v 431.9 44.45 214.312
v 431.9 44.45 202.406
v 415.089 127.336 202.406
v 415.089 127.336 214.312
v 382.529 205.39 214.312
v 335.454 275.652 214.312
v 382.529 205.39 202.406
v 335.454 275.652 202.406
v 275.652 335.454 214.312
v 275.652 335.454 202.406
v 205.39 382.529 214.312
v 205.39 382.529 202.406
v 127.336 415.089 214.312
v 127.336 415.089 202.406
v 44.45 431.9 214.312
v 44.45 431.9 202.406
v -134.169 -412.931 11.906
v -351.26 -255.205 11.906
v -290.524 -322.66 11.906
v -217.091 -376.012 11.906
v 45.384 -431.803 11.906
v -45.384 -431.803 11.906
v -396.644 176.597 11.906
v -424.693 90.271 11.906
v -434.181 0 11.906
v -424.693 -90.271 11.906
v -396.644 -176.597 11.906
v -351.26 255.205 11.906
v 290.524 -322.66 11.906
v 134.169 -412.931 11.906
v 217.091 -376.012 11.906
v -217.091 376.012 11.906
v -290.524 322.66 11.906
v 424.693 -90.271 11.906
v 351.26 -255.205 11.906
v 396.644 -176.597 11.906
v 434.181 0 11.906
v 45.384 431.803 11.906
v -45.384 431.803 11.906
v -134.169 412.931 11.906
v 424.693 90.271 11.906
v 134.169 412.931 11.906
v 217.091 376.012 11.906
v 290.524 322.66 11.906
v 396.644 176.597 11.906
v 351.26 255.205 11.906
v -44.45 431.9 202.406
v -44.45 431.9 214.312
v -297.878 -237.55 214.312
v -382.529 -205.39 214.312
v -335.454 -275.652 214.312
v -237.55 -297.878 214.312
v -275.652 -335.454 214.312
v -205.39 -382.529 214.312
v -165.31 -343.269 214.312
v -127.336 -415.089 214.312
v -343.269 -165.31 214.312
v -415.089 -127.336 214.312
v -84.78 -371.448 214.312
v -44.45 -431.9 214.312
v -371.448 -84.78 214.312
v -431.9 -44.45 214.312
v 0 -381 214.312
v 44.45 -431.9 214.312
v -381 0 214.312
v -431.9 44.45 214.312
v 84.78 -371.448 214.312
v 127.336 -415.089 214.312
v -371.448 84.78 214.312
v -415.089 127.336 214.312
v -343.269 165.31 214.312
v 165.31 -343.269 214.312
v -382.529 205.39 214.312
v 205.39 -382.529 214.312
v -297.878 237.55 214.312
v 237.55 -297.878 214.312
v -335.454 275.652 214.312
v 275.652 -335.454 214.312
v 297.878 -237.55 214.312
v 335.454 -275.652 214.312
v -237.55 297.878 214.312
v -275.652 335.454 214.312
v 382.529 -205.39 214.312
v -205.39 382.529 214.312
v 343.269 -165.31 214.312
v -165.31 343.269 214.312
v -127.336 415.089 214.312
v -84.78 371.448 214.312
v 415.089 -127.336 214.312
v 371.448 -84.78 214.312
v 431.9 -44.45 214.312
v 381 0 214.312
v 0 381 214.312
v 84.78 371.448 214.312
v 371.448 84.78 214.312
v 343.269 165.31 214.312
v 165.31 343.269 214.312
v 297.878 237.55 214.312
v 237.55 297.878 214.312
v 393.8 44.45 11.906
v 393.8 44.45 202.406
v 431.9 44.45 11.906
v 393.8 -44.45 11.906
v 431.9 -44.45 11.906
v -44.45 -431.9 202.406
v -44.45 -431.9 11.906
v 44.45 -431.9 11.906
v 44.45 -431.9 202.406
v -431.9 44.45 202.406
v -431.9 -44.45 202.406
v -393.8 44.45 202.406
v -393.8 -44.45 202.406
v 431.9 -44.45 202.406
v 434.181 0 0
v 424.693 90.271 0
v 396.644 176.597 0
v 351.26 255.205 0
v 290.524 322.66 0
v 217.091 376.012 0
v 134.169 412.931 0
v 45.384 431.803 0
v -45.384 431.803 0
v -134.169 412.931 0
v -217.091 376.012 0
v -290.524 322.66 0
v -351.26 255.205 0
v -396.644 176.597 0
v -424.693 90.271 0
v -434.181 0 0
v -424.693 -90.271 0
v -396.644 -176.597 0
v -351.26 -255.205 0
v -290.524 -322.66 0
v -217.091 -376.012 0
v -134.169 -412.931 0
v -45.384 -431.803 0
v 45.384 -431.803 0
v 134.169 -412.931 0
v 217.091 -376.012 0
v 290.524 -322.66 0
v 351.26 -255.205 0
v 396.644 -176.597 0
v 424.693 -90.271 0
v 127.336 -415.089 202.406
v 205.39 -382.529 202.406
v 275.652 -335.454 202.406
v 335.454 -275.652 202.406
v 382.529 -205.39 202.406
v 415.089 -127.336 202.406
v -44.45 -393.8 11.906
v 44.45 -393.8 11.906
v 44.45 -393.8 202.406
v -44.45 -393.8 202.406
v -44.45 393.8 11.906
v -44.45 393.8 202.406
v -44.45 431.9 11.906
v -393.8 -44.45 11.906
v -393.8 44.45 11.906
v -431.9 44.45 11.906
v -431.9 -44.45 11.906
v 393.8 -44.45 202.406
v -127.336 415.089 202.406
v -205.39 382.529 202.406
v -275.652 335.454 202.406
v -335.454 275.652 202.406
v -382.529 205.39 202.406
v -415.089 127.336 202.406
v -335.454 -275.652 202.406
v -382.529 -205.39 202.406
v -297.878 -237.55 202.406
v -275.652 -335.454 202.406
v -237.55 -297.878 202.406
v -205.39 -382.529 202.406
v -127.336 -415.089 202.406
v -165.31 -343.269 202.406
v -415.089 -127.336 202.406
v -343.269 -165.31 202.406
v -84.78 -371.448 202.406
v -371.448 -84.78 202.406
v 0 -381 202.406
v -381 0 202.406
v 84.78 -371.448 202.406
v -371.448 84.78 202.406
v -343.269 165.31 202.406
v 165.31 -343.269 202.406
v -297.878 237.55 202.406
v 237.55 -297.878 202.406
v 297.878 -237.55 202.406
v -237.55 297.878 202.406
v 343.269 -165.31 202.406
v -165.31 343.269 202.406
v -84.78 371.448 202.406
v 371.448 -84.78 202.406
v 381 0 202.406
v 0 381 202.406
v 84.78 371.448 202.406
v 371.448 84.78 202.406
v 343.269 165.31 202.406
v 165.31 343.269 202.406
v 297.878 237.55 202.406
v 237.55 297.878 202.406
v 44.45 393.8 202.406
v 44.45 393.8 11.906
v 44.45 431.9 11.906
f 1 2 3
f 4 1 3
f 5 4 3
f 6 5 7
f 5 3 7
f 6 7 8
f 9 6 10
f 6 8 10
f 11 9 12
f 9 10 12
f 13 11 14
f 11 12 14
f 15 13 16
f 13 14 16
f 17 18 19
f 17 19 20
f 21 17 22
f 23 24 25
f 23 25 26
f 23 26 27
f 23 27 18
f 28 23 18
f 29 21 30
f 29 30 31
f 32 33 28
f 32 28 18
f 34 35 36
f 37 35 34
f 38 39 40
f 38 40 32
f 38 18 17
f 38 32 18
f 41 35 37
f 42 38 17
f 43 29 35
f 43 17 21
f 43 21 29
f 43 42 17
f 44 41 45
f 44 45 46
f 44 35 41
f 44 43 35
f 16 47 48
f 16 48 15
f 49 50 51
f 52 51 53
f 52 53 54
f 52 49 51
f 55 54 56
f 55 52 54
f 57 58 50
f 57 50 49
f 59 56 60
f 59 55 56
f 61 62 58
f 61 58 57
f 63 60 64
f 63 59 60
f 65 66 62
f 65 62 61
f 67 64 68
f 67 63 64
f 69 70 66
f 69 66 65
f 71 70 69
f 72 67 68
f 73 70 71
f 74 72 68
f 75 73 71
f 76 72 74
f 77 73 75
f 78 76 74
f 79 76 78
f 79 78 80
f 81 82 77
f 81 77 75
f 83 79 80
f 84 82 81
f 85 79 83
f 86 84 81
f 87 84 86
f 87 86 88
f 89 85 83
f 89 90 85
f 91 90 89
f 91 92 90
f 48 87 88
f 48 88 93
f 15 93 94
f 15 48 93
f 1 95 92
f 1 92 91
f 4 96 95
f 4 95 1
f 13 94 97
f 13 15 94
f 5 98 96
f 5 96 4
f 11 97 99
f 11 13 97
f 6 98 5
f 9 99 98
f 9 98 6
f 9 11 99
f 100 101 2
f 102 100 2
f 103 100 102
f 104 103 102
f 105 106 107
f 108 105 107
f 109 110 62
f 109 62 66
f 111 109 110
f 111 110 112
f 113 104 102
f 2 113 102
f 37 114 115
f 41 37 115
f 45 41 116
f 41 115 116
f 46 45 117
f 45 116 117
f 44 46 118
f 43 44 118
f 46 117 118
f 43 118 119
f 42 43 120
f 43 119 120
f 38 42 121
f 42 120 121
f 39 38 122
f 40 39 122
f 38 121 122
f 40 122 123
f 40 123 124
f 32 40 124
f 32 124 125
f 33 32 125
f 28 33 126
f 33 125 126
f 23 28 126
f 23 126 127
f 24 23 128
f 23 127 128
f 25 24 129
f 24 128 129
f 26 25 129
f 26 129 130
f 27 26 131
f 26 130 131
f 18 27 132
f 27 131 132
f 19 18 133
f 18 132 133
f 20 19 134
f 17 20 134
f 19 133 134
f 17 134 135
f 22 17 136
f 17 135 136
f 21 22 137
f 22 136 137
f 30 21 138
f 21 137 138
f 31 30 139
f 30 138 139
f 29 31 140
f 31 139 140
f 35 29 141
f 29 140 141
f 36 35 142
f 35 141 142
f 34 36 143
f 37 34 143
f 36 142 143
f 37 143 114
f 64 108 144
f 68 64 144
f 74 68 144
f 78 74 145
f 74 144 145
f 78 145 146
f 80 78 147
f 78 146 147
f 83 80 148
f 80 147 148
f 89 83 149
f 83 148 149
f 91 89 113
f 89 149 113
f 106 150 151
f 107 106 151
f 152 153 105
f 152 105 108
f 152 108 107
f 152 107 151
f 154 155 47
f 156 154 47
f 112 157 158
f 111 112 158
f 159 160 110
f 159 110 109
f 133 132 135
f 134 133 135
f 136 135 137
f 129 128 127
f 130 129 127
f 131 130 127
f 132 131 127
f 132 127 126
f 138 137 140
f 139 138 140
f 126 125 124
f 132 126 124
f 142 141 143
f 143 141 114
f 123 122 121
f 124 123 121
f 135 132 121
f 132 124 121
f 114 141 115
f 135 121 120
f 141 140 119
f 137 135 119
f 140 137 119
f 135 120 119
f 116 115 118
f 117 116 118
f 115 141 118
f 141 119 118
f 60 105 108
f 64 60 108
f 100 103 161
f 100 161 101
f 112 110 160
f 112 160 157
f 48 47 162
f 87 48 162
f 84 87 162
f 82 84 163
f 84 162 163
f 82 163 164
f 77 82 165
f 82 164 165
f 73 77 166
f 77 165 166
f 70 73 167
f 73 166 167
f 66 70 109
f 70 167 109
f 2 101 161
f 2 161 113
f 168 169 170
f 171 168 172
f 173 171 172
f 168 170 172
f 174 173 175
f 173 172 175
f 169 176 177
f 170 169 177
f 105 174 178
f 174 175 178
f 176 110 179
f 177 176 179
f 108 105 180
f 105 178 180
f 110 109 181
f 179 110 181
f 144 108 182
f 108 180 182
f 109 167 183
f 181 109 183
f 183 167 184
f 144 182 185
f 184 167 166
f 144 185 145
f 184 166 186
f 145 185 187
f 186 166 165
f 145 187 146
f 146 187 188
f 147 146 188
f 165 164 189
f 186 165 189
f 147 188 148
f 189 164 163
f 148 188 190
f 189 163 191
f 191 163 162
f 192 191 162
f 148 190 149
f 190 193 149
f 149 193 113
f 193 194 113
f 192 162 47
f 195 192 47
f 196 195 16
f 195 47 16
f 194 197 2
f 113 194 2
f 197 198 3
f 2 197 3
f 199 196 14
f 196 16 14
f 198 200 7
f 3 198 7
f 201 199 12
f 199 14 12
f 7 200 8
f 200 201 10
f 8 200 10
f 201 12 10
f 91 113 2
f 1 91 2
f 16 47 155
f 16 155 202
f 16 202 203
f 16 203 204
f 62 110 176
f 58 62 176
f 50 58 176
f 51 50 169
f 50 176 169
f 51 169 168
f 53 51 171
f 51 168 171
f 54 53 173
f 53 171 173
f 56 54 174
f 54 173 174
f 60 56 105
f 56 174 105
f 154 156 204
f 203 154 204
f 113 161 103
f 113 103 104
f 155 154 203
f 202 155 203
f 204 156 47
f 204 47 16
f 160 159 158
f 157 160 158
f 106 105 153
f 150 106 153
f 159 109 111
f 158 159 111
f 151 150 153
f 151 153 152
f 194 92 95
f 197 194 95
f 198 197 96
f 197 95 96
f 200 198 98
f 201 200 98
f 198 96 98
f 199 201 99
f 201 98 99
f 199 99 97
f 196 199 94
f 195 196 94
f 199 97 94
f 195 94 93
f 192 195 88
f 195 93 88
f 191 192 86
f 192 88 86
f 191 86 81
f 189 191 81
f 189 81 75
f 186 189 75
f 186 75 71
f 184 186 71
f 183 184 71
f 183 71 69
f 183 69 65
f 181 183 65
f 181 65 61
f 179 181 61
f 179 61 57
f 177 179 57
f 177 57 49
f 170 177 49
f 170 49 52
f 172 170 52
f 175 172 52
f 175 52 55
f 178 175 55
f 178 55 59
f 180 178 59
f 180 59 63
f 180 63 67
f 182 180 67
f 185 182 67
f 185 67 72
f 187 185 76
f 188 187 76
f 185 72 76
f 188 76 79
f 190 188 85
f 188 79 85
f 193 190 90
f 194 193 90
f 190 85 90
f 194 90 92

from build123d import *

# Parameters (mm, degrees)
F0_R     = 434.18125
F1_DEPTH = 11.90625
F3_W     = 88.9
F3_H     = 38.1
F3_W_2   = 38.1
F3_H_2   = 88.9
F4_DEPTH = 190.5
F5_DEPTH = 11.90625
F6_R     = 381
F7_DEPTH = 25.4


with BuildPart() as f1:
    # F0 (on Top) → F1 (new body)
    with BuildSketch(Plane.XY):
        Circle(F0_R)
    extrude(amount=F1_DEPTH)


with BuildPart() as f4:
    # F3 (on offset) → F4 (new body, through all)
    with BuildSketch(Plane.XY.offset(202.40625)):
        with Locations((0, 412.849937)):
            Rectangle(F3_W, F3_H)
        with Locations((412.849937, 0)):
            Rectangle(F3_W_2, F3_H_2)
        with Locations((0, -412.849937)):
            Rectangle(F3_W, F3_H)
        with Locations((-412.849937, 0)):
            Rectangle(F3_W_2, F3_H_2)
    extrude(amount=-F4_DEPTH)


with BuildPart() as f5:
    # F3 (on offset) → F5 (new body)
    with BuildSketch(Plane.XY.offset(202.40625)):
        with BuildLine():
            Line((393.799937, 44.45), (431.899937, 44.45))
            ThreePointArc((431.899937, 44.45), (307.012506, 307.012506), (44.45, 431.899937))
            Line((44.45, 431.899937), (44.45, 393.799937))
            Line((44.45, 393.799937), (-44.45, 393.799937))
            Line((-44.45, 393.799937), (-44.45, 431.899937))
            ThreePointArc((-44.45, 431.899937), (-307.012506, 307.012506), (-431.899937, 44.45))
            Line((-431.899937, 44.45), (-393.799937, 44.45))
            Line((-393.799937, 44.45), (-393.799937, -44.45))
            Line((-393.799937, -44.45), (-431.899937, -44.45))
            ThreePointArc((-431.899937, -44.45), (-307.012506, -307.012506), (-44.45, -431.899937))
            Line((-44.45, -431.899937), (-44.45, -393.799937))
            Line((-44.45, -393.799937), (44.45, -393.799937))
            Line((44.45, -393.799937), (44.45, -431.899937))
            ThreePointArc((44.45, -431.899937), (307.012506, -307.012506), (431.899937, -44.45))
            Line((431.899937, -44.45), (393.799937, -44.45))
            Line((393.799937, -44.45), (393.799937, 44.45))
        make_face()
        with Locations((-412.849937, 0)):
            Rectangle(F3_W_2, F3_H_2)
        with Locations((0, -412.849937)):
            Rectangle(F3_W, F3_H)
        with Locations((412.849937, 0)):
            Rectangle(F3_W_2, F3_H_2)
        with Locations((0, 412.849937)):
            Rectangle(F3_W, F3_H)
    extrude(amount=F5_DEPTH)

    # F6 (on face) → F7 (cut)
    with BuildSketch(Plane.XY.offset(214.3125)):
        Circle(F6_R)
    extrude(amount=-F7_DEPTH, mode=Mode.SUBTRACT)


solid = Compound([f1.part, f4.part, f5.part])
